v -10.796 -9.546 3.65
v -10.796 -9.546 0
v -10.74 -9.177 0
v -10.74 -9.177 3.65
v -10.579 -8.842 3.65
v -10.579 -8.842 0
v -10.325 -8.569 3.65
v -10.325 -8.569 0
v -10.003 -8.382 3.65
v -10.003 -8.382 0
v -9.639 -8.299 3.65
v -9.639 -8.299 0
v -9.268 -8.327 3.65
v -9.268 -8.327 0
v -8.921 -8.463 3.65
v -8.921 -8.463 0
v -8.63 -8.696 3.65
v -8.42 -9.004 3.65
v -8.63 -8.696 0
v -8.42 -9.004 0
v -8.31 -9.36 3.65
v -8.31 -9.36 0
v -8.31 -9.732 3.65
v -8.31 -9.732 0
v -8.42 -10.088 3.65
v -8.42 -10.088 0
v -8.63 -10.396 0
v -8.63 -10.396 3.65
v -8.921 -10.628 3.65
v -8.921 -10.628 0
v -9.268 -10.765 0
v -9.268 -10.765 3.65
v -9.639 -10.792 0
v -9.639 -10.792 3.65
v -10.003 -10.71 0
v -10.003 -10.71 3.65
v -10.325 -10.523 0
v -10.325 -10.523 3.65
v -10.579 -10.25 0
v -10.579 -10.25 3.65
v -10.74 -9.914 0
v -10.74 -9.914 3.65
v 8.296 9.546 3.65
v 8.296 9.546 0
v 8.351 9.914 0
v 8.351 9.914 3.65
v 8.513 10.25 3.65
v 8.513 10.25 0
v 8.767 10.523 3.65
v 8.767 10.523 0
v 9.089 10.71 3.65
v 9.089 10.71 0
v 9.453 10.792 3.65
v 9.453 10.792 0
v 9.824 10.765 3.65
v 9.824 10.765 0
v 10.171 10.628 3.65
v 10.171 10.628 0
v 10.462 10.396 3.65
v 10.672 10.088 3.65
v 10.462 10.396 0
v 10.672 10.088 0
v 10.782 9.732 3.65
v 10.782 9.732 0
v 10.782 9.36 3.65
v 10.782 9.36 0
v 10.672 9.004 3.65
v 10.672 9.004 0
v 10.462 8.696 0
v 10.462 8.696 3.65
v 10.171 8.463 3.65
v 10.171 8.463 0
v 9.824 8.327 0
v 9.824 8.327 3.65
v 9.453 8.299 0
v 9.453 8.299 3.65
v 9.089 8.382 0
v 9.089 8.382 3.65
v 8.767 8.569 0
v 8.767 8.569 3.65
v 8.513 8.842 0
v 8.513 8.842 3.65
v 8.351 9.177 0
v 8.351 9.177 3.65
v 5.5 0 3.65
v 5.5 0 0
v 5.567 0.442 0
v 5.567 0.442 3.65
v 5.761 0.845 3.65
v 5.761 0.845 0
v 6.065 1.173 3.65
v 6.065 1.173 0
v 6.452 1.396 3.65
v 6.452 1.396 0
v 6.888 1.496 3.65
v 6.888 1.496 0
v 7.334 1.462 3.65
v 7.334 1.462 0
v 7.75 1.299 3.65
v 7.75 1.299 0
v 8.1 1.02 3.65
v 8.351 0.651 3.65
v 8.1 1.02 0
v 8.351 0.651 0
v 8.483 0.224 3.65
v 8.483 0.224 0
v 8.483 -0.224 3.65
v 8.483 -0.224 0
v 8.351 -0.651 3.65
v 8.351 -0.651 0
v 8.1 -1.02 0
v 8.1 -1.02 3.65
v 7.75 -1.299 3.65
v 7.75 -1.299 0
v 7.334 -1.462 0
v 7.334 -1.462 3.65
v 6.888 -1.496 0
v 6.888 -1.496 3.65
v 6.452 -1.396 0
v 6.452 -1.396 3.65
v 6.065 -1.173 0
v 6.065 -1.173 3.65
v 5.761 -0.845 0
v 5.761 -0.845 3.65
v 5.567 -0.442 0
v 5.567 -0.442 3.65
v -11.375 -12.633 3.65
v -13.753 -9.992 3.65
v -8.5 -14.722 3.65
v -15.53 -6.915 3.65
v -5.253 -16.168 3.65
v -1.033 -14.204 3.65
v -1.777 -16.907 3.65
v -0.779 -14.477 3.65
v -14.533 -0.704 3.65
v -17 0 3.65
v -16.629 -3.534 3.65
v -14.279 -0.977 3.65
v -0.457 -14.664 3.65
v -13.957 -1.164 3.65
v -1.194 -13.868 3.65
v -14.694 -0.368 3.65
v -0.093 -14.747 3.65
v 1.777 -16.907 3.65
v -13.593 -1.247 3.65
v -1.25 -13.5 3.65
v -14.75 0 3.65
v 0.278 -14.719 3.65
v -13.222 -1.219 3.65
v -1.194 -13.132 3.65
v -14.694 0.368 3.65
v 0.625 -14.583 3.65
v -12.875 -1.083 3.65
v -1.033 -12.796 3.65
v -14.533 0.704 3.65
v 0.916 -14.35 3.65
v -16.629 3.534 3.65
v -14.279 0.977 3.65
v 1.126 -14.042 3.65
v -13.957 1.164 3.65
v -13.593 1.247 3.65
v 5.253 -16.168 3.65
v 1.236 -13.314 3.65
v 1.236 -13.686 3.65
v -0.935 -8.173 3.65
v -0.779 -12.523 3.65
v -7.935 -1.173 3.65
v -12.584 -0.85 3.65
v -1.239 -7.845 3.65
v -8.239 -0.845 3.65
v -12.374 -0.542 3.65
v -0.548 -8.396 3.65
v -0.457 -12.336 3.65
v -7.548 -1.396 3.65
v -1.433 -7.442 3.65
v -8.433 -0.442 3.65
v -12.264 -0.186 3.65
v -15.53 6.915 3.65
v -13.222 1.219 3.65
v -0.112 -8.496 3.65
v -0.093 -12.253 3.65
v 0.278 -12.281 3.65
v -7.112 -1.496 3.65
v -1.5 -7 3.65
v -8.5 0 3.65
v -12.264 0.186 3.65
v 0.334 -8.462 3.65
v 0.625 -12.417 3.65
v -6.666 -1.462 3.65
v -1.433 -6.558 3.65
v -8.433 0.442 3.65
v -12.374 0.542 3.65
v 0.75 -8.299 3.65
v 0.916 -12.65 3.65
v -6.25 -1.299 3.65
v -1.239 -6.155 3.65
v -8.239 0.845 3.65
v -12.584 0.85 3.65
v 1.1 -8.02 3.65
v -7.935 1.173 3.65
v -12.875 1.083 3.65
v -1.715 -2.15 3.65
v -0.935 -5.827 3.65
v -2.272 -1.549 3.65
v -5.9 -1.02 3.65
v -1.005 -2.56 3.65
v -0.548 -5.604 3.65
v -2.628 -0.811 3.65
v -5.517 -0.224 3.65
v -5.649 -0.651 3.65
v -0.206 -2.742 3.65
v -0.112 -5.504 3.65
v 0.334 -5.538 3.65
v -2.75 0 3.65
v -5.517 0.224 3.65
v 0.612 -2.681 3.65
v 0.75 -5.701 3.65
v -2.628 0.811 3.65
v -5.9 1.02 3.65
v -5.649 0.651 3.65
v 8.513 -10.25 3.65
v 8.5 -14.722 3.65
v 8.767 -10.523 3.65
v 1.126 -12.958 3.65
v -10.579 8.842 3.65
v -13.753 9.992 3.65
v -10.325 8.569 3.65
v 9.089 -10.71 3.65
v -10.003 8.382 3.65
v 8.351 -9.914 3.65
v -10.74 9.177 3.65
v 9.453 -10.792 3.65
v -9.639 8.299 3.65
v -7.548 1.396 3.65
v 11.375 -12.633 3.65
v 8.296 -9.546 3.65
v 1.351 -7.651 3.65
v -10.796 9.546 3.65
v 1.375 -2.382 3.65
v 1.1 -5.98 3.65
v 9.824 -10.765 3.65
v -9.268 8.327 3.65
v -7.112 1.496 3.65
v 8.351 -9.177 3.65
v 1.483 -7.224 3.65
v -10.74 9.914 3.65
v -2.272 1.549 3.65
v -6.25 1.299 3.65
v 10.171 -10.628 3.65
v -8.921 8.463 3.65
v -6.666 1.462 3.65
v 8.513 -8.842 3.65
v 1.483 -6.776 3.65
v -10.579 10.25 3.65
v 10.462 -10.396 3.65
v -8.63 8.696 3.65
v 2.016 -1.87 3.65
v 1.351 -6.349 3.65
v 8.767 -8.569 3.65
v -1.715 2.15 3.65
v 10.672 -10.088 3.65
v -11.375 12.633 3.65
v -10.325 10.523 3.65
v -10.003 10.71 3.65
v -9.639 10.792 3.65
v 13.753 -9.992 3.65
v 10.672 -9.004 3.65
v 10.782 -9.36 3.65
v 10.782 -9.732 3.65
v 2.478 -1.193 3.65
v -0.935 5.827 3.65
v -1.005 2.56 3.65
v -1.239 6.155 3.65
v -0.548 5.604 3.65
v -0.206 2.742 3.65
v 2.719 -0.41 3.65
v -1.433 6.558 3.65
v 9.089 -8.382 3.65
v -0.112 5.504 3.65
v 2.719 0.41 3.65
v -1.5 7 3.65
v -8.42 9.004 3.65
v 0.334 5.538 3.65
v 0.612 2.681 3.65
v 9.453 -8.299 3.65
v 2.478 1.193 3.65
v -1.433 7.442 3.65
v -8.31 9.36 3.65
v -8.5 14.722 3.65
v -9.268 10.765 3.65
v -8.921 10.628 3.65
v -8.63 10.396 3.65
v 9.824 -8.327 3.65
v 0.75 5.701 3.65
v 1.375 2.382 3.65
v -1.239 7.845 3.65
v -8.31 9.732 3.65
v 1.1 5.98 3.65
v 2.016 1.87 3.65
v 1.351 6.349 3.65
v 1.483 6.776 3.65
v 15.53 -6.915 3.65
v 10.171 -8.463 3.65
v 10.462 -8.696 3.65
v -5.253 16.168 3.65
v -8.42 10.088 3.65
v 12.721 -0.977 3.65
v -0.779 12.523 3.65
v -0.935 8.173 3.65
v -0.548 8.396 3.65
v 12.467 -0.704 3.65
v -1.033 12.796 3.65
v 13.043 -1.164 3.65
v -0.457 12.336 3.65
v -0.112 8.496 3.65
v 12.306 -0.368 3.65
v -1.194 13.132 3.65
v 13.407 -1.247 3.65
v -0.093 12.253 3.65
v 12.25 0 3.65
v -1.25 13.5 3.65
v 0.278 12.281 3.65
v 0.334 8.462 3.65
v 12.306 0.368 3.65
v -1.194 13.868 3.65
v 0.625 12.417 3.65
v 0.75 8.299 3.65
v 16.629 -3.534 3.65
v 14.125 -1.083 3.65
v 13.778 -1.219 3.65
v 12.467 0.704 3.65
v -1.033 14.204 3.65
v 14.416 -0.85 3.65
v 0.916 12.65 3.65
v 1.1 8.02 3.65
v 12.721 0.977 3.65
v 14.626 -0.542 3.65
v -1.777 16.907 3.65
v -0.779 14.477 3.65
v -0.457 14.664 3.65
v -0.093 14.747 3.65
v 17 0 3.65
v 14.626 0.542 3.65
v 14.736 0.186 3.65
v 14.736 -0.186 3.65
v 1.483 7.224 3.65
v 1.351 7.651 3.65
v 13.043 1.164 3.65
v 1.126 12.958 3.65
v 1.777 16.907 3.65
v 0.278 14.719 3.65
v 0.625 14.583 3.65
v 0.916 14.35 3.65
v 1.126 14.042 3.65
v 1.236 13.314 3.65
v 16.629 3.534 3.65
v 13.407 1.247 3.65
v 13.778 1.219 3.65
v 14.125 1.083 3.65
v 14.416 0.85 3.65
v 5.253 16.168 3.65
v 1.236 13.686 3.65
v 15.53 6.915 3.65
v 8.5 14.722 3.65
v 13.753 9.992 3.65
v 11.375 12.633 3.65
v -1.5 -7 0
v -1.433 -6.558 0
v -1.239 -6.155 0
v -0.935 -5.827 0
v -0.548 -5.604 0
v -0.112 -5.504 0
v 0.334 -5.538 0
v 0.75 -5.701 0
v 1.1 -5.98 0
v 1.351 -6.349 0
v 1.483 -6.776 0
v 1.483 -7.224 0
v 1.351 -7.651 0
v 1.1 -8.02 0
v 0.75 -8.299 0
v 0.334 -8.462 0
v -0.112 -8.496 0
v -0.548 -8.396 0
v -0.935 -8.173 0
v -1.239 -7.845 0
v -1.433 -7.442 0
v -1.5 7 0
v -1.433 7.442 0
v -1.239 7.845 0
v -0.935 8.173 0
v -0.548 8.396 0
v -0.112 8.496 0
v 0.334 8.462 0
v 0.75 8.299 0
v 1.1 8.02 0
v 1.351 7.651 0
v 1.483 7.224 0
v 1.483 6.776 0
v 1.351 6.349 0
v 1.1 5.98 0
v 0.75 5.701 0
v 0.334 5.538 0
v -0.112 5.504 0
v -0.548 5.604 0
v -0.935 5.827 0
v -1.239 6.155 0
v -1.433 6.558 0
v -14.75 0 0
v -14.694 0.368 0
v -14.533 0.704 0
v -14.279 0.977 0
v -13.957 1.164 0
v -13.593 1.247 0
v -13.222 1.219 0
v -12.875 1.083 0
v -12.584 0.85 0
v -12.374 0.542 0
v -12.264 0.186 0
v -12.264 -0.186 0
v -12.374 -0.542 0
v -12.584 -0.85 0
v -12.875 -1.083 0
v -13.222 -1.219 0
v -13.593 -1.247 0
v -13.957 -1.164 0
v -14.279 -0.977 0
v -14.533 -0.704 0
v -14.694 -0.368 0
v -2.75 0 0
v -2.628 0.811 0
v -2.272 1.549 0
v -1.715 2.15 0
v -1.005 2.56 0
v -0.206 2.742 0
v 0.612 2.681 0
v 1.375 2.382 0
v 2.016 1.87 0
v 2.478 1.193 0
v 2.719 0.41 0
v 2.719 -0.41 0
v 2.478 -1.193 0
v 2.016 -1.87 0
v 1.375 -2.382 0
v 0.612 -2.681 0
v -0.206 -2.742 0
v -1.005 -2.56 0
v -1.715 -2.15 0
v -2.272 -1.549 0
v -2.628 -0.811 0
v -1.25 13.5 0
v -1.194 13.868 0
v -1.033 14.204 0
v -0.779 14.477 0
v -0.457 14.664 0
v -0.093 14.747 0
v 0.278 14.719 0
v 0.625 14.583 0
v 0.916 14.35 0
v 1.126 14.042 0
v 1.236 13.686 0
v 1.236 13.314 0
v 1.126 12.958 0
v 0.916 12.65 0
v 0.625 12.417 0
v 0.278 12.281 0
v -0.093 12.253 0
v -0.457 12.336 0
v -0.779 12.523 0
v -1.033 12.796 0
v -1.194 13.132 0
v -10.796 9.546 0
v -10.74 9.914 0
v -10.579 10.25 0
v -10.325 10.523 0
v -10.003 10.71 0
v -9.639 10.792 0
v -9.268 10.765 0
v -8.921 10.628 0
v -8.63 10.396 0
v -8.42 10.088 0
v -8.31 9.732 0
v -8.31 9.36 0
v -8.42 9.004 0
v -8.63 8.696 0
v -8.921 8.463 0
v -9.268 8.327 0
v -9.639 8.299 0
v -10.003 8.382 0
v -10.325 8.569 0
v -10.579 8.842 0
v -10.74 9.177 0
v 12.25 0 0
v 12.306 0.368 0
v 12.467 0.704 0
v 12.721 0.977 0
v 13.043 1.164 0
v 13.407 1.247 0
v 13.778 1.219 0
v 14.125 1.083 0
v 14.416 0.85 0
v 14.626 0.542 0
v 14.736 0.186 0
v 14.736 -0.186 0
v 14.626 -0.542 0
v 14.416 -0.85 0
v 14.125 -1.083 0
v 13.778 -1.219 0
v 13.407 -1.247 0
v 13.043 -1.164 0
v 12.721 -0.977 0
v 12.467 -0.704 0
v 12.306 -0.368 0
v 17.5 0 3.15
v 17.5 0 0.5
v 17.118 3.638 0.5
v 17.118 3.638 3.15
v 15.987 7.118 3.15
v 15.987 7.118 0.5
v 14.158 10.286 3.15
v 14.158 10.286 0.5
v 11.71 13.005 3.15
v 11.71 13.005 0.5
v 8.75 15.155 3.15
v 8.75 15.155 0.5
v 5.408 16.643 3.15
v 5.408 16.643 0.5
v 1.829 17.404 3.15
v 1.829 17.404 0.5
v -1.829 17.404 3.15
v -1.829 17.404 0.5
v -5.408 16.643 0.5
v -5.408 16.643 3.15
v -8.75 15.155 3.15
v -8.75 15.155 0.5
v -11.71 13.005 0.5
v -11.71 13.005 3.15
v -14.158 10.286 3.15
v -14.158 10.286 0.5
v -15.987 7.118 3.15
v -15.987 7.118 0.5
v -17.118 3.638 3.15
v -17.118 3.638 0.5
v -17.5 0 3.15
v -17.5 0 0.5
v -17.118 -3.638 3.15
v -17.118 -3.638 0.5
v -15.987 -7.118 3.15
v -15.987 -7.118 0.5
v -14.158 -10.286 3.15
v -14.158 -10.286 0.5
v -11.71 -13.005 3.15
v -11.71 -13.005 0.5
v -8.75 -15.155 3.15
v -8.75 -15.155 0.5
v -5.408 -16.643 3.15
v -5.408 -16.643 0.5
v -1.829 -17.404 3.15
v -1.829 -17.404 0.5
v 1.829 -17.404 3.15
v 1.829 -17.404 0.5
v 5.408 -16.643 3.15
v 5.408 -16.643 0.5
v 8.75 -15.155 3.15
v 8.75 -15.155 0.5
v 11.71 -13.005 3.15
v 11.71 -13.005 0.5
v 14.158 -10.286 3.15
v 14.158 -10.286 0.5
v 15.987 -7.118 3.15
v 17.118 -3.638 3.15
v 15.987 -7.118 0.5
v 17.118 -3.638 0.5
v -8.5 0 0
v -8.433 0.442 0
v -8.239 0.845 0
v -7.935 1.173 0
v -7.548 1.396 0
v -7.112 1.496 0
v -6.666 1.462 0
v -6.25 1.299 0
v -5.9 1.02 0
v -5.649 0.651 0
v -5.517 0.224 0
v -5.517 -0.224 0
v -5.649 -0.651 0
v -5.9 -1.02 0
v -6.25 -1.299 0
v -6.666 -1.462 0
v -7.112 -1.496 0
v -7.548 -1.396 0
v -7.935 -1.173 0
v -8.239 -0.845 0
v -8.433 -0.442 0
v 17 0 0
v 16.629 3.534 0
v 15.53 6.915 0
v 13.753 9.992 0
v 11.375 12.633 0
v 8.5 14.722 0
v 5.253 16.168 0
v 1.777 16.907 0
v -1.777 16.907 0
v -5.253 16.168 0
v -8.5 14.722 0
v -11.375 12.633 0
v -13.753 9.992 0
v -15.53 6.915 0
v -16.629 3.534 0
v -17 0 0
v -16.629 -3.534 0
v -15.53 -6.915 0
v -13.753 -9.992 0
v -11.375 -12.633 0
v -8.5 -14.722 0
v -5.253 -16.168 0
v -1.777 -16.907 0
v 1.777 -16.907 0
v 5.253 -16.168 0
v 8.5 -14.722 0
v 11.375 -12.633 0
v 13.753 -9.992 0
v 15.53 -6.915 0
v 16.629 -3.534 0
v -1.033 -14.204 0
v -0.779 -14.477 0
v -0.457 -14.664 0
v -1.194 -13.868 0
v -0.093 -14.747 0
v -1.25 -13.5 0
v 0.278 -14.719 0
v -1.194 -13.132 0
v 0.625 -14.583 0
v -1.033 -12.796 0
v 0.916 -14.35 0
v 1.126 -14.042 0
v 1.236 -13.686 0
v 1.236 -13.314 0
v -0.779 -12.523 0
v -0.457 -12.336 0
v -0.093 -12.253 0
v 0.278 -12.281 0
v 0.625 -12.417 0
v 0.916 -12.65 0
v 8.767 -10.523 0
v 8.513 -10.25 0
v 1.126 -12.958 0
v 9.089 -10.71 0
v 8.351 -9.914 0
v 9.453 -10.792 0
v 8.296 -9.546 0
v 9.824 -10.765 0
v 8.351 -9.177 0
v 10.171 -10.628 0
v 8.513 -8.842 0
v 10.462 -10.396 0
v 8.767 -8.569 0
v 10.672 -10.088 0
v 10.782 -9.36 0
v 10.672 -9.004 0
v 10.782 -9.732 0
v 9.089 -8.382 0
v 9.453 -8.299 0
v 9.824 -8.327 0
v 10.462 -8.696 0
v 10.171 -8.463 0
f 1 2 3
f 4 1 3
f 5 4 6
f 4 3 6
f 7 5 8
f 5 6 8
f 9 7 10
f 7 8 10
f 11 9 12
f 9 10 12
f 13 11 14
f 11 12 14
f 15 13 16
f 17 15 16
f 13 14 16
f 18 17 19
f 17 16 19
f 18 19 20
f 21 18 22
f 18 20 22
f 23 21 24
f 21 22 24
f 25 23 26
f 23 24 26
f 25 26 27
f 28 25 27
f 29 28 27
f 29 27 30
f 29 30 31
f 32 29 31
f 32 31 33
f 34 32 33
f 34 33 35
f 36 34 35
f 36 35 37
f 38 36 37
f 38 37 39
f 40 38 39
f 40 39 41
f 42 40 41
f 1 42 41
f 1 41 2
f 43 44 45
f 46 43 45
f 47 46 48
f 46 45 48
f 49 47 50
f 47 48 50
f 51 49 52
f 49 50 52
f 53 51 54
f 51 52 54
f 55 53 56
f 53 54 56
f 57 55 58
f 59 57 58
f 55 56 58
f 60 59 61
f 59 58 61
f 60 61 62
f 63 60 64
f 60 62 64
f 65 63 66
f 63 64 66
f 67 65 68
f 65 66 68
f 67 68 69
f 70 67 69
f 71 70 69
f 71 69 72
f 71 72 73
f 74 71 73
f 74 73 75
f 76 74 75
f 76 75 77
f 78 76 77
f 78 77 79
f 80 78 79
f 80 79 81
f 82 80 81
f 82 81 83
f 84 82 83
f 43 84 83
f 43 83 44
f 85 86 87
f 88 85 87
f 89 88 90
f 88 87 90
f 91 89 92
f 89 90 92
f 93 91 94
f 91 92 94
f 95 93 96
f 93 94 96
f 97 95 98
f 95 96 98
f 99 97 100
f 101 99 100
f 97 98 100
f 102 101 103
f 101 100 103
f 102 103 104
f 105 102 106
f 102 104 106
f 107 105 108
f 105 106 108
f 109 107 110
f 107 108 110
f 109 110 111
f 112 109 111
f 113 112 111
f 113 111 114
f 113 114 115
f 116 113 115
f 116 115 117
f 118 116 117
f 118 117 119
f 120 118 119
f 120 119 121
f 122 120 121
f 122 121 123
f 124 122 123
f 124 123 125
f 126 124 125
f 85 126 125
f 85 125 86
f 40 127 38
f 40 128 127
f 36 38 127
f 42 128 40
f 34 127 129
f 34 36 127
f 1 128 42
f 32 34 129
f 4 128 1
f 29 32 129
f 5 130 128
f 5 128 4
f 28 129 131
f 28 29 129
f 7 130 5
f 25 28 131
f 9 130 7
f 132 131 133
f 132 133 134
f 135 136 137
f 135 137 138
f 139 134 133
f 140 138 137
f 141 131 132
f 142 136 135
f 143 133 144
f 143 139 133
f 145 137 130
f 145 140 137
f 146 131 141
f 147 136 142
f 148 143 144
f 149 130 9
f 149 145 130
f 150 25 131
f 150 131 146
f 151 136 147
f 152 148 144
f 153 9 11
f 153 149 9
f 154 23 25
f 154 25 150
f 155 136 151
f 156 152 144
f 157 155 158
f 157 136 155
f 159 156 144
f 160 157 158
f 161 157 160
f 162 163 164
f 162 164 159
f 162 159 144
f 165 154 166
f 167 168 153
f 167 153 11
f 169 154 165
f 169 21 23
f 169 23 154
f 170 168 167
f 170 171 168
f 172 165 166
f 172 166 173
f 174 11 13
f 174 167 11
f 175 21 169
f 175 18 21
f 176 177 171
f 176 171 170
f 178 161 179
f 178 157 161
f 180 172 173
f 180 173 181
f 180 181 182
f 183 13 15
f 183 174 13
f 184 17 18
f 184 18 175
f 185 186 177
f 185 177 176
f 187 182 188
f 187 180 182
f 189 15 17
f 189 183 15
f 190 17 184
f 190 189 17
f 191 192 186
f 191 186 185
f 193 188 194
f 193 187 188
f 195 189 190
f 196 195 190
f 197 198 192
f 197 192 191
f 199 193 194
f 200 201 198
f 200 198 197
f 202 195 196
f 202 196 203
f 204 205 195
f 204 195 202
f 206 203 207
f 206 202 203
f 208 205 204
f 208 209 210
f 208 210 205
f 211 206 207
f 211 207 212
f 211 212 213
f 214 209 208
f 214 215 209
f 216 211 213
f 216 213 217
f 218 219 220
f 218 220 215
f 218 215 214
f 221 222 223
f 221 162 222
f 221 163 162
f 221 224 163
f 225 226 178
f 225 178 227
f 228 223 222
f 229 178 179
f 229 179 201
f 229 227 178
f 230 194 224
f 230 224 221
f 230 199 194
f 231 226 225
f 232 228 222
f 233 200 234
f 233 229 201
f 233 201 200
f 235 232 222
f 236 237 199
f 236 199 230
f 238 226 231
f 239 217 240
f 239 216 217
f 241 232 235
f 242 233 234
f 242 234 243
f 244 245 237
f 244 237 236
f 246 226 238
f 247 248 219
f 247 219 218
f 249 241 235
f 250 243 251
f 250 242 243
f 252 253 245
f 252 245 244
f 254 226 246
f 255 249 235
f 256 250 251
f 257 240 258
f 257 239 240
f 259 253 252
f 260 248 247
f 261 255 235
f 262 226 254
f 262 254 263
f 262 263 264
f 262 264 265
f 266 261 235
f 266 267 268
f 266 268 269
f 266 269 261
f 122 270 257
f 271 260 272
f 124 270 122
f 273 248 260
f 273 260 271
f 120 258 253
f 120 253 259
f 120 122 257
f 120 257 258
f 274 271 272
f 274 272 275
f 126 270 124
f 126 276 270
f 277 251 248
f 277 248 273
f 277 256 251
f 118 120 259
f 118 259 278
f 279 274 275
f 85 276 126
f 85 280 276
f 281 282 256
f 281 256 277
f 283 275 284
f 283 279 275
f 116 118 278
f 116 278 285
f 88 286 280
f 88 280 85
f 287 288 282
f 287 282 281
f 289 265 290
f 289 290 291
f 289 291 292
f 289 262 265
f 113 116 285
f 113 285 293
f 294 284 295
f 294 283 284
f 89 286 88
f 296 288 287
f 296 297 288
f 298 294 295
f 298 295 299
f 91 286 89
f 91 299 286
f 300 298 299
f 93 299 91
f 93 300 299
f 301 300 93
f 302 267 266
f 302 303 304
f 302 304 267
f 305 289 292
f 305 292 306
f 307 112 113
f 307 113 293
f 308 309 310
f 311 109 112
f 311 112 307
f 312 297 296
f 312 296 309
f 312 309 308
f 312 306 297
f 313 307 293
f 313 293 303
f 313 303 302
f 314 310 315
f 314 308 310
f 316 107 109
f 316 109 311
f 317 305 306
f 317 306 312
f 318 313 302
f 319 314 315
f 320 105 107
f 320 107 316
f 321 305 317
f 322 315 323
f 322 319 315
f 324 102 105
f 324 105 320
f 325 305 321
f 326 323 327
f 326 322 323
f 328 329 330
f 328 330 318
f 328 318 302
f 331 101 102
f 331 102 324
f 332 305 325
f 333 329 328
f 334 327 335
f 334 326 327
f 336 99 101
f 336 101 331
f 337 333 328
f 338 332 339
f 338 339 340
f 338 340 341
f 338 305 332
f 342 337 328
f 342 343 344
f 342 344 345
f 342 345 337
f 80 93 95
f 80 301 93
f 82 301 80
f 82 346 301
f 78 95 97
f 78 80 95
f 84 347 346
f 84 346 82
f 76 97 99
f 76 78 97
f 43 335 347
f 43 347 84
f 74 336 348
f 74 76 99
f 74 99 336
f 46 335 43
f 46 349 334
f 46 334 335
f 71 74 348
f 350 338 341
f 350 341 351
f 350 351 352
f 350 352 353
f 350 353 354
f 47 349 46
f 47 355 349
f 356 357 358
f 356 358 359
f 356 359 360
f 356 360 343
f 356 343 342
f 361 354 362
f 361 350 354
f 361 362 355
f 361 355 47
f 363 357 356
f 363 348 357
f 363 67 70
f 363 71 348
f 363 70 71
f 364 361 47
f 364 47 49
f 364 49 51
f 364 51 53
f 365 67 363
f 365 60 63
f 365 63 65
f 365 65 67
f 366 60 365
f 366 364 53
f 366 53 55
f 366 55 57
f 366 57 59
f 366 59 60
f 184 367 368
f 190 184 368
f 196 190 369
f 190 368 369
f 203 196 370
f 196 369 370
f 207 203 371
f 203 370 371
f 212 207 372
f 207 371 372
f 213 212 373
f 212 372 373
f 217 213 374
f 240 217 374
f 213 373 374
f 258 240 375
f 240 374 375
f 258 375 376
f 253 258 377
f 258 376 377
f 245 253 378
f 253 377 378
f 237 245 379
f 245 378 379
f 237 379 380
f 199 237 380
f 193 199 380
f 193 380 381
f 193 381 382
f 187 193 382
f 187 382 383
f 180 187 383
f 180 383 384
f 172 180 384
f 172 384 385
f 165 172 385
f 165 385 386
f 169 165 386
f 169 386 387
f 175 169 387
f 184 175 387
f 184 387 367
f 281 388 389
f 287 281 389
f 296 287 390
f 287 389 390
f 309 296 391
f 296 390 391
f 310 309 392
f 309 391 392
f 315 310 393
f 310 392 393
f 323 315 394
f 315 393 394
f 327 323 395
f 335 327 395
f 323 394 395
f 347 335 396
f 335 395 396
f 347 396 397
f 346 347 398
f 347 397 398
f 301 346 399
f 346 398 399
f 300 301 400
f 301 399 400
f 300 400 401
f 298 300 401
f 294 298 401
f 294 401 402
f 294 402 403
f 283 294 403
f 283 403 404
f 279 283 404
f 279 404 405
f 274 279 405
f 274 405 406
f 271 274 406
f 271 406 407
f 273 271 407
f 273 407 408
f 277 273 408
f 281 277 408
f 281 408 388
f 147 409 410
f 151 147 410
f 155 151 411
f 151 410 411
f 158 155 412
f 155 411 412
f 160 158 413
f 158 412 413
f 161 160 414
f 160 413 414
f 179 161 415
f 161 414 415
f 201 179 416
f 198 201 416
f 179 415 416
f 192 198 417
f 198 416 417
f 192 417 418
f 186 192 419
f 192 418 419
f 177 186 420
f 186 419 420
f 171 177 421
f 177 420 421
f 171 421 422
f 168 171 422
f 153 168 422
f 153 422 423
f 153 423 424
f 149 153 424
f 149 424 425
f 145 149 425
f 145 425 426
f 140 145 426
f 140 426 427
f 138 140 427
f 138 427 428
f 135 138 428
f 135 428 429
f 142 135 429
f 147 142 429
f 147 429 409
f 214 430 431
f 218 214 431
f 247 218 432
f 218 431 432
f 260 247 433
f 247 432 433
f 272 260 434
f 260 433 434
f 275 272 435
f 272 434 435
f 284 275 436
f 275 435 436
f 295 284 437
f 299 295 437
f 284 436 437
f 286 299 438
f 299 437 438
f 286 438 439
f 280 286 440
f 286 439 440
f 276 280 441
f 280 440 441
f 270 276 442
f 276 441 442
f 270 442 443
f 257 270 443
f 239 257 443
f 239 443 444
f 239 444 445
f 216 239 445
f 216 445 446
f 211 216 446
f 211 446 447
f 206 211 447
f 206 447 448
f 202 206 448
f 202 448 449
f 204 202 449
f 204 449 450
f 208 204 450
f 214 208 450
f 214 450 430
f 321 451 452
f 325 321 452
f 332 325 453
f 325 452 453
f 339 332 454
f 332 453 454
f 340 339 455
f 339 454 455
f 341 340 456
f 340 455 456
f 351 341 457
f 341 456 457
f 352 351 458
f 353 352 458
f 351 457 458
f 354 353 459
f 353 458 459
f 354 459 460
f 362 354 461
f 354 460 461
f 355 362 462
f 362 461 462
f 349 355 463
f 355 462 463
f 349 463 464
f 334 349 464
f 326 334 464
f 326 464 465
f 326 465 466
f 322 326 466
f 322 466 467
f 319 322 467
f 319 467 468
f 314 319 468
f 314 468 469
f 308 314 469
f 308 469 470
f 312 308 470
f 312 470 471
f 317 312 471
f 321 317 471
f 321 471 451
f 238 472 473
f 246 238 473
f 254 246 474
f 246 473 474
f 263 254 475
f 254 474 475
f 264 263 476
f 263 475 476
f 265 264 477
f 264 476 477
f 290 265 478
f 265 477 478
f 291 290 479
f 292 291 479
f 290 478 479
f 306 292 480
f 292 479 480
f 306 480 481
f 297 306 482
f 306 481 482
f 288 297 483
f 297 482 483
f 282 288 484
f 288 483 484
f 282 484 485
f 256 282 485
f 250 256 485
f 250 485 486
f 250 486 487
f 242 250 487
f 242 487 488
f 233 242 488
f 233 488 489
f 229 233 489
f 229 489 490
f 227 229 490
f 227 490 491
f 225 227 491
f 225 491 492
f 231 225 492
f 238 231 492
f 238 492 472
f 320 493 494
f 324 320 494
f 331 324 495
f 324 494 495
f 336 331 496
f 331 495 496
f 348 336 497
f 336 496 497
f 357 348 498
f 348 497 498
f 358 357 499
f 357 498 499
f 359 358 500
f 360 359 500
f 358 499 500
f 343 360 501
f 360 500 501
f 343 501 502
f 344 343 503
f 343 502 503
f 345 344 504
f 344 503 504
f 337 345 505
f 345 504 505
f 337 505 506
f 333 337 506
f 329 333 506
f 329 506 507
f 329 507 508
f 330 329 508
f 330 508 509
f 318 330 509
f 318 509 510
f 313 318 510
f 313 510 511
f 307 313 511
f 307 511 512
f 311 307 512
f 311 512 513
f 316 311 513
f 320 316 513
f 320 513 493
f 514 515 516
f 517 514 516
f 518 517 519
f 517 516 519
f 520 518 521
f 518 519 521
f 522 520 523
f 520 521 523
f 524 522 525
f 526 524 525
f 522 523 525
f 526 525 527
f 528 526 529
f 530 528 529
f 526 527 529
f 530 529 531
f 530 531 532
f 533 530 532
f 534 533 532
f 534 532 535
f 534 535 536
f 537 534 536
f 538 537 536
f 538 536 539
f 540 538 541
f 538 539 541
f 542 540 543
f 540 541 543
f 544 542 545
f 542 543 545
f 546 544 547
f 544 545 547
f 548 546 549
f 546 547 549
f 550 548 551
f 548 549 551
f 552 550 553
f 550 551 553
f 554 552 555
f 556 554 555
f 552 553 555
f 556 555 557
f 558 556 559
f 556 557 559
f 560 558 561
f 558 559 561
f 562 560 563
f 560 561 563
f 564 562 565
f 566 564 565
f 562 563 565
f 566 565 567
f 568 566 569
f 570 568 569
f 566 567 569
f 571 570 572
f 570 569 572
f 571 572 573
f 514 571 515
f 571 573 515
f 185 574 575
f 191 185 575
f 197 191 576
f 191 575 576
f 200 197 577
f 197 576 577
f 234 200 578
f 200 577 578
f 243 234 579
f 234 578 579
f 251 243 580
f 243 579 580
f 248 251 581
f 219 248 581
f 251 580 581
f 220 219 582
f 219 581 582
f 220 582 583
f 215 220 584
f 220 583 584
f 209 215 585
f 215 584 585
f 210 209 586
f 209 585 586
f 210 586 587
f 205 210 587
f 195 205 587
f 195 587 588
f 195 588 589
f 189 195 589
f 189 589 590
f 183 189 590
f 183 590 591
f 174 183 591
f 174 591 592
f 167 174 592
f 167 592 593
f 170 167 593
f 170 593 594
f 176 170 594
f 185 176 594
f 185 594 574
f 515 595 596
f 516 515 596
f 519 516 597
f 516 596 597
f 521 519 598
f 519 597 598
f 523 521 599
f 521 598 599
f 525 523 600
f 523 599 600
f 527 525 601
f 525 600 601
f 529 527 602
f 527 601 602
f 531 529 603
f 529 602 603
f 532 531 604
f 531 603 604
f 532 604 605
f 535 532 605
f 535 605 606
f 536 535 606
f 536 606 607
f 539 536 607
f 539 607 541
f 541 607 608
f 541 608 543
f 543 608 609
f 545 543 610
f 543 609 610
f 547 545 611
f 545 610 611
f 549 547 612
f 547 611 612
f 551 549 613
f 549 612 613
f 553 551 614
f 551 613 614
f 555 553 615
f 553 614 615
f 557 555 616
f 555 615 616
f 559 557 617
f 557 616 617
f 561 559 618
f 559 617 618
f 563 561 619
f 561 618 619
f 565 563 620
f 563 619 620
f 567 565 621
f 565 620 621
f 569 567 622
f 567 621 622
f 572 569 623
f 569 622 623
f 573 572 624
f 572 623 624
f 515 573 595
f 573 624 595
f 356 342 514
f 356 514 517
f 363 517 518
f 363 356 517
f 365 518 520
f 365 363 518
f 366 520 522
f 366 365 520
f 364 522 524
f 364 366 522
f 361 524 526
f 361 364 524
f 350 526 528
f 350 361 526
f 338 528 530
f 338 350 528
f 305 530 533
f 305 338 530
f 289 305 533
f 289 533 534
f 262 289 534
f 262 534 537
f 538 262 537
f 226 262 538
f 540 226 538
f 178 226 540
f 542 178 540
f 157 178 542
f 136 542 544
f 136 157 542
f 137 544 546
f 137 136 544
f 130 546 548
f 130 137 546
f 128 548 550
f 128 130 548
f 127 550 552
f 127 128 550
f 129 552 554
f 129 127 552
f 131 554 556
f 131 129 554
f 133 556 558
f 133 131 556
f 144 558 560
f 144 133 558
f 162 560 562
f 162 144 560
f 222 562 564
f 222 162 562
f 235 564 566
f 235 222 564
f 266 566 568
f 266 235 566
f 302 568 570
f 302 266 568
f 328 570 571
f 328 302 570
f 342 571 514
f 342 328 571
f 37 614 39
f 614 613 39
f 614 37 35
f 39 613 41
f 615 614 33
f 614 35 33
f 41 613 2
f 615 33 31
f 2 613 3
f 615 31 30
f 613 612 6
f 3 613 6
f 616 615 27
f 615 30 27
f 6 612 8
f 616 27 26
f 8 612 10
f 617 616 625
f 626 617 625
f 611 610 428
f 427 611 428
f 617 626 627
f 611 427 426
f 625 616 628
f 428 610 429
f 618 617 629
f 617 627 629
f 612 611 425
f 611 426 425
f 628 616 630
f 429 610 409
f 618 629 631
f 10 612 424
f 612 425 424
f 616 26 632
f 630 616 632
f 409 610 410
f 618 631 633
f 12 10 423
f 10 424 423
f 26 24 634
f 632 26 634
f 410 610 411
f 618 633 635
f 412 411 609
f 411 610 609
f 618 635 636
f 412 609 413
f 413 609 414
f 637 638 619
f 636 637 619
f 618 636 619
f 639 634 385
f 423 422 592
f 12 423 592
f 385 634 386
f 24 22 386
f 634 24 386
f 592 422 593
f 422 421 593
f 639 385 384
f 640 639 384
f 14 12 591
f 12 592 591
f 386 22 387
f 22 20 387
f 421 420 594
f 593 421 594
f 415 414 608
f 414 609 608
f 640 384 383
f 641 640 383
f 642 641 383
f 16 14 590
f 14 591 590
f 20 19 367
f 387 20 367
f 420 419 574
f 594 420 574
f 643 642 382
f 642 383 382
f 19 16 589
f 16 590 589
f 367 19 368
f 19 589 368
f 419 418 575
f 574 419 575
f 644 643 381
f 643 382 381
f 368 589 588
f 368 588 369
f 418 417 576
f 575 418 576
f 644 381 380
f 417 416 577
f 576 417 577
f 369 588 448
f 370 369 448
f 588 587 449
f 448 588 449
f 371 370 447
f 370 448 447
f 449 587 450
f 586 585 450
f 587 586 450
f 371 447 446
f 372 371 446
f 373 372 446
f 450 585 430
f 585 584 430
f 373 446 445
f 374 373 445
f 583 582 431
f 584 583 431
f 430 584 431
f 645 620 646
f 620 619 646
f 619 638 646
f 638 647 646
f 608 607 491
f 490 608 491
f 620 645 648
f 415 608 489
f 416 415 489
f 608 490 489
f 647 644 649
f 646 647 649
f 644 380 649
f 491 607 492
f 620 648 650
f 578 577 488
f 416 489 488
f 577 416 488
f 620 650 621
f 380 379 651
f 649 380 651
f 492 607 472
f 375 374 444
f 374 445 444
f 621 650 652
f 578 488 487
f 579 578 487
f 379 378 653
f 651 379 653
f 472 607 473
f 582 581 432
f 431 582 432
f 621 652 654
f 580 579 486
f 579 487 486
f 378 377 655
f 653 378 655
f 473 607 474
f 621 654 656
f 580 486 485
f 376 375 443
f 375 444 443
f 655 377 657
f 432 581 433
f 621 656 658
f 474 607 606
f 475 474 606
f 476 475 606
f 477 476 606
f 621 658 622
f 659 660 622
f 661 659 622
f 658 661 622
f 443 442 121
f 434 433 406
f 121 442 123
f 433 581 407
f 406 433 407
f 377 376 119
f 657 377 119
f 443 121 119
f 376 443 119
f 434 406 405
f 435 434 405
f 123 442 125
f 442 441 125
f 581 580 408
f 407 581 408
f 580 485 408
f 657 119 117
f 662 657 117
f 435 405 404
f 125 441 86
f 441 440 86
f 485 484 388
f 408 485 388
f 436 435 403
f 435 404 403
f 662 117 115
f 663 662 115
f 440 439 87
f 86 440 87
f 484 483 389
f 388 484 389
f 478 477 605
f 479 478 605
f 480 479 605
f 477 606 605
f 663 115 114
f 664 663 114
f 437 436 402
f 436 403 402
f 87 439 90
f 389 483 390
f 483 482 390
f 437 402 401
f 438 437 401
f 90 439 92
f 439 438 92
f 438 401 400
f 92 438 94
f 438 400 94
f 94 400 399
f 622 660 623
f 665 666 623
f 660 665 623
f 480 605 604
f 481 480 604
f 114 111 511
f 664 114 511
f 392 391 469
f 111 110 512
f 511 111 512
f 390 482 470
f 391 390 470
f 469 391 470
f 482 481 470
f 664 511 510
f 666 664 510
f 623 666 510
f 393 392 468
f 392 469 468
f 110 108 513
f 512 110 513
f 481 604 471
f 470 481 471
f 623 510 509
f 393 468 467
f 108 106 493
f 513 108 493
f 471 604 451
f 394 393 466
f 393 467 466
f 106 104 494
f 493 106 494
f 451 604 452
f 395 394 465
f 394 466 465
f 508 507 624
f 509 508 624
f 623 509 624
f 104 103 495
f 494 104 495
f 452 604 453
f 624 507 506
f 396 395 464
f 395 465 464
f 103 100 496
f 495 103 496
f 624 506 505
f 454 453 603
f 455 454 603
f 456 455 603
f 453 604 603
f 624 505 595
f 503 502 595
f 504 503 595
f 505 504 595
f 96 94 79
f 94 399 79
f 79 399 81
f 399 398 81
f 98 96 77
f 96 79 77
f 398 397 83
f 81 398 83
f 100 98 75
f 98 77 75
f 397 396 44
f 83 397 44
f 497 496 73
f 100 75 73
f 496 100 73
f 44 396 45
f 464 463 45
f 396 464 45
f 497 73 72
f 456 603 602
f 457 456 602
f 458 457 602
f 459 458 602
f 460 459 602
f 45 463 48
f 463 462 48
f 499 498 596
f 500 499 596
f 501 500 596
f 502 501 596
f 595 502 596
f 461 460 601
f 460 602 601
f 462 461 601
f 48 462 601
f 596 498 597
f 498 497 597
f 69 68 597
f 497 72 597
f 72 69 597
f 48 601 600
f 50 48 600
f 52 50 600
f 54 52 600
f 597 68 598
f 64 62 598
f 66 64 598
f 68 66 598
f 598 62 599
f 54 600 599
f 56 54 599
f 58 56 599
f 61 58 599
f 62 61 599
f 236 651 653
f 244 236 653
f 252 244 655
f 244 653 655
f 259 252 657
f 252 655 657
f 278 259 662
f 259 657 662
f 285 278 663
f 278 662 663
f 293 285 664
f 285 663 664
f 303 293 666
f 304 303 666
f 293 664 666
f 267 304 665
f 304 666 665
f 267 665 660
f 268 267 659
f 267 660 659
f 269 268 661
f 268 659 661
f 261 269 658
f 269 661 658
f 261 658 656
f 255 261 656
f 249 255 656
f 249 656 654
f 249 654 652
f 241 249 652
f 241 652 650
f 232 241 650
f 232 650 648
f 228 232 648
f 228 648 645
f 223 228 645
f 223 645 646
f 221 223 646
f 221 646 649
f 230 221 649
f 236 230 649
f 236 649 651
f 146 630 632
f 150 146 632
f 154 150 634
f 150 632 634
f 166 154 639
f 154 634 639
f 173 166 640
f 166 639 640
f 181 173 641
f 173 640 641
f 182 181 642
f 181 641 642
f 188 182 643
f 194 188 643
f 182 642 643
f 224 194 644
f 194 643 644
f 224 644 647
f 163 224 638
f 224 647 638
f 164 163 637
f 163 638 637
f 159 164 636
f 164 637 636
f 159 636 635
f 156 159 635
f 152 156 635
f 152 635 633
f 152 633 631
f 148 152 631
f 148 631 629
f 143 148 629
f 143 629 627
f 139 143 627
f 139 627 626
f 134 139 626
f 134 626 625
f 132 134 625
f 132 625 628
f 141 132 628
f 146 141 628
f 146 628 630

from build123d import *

# Parameters (mm, degrees)
SKETCH_1_R          = 17.5
EXTRUDE_1_DEPTH     = 3.65
SKETCH_3_R          = 1.25
CUT_EXTRUDE_1_DEPTH = 5
CHAMFER_1_SIZE      = 0.5
SKETCH_4_R          = 1.5
CUT_EXTRUDE_2_DEPTH = 10
SKETCH_5_R          = 2.75
CUT_EXTRUDE_3_DEPTH = 10


with BuildPart() as part:
    # 草图1 → 凸台-拉伸1 (new body)
    with BuildSketch(Plane.XY):
        Circle(SKETCH_1_R)
    extrude(amount=EXTRUDE_1_DEPTH)

    # 草图3 → 切除-拉伸1 (cut)
    with BuildSketch(Plane(origin=(0, 0, 0), x_dir=(-1, 0, 0), z_dir=(0, 0, -1))):
        with Locations((0, 13.5)):
            Circle(SKETCH_3_R)
        with Locations((9.545941546, 9.545941546)):
            Circle(SKETCH_3_R)
        with Locations((13.5, 0)):
            Circle(SKETCH_3_R)
        with Locations((9.545941546, -9.545941546)):
            Circle(SKETCH_3_R)
        with Locations((0, -13.5)):
            Circle(SKETCH_3_R)
        with Locations((-9.545941546, -9.545941546)):
            Circle(SKETCH_3_R)
        with Locations((-13.5, 0)):
            Circle(SKETCH_3_R)
        with Locations((-9.545941546, 9.545941546)):
            Circle(SKETCH_3_R)
    extrude(amount=-CUT_EXTRUDE_1_DEPTH, mode=Mode.SUBTRACT)

    # 倒角1
    chamfer_1_edges = [part.edges().sort_by_distance(p)[0] for p in [
        (-17.5, 0, 0),
        (-17.5, 0, 3.65),
    ]]
    chamfer(chamfer_1_edges, length=CHAMFER_1_SIZE)

    # 草图4 → 切除-拉伸2 (cut)
    with BuildSketch(Plane(origin=(0, 0, 0), x_dir=(-1, 0, 0), z_dir=(0, 0, -1))):
        with Locations((0, 7)):
            Circle(SKETCH_4_R)
        with Locations((7, 0)):
            Circle(SKETCH_4_R)
        with Locations((0, -7)):
            Circle(SKETCH_4_R)
        with Locations((-7, 0)):
            Circle(SKETCH_4_R)
    extrude(amount=-CUT_EXTRUDE_2_DEPTH, mode=Mode.SUBTRACT)

    # 草图5 → 切除-拉伸3 (cut)
    with BuildSketch(Plane(origin=(0, 0, 0), x_dir=(-1, 0, 0), z_dir=(0, 0, -1))):
        Circle(SKETCH_5_R)
    extrude(amount=-CUT_EXTRUDE_3_DEPTH, mode=Mode.SUBTRACT)


solid = part.part
